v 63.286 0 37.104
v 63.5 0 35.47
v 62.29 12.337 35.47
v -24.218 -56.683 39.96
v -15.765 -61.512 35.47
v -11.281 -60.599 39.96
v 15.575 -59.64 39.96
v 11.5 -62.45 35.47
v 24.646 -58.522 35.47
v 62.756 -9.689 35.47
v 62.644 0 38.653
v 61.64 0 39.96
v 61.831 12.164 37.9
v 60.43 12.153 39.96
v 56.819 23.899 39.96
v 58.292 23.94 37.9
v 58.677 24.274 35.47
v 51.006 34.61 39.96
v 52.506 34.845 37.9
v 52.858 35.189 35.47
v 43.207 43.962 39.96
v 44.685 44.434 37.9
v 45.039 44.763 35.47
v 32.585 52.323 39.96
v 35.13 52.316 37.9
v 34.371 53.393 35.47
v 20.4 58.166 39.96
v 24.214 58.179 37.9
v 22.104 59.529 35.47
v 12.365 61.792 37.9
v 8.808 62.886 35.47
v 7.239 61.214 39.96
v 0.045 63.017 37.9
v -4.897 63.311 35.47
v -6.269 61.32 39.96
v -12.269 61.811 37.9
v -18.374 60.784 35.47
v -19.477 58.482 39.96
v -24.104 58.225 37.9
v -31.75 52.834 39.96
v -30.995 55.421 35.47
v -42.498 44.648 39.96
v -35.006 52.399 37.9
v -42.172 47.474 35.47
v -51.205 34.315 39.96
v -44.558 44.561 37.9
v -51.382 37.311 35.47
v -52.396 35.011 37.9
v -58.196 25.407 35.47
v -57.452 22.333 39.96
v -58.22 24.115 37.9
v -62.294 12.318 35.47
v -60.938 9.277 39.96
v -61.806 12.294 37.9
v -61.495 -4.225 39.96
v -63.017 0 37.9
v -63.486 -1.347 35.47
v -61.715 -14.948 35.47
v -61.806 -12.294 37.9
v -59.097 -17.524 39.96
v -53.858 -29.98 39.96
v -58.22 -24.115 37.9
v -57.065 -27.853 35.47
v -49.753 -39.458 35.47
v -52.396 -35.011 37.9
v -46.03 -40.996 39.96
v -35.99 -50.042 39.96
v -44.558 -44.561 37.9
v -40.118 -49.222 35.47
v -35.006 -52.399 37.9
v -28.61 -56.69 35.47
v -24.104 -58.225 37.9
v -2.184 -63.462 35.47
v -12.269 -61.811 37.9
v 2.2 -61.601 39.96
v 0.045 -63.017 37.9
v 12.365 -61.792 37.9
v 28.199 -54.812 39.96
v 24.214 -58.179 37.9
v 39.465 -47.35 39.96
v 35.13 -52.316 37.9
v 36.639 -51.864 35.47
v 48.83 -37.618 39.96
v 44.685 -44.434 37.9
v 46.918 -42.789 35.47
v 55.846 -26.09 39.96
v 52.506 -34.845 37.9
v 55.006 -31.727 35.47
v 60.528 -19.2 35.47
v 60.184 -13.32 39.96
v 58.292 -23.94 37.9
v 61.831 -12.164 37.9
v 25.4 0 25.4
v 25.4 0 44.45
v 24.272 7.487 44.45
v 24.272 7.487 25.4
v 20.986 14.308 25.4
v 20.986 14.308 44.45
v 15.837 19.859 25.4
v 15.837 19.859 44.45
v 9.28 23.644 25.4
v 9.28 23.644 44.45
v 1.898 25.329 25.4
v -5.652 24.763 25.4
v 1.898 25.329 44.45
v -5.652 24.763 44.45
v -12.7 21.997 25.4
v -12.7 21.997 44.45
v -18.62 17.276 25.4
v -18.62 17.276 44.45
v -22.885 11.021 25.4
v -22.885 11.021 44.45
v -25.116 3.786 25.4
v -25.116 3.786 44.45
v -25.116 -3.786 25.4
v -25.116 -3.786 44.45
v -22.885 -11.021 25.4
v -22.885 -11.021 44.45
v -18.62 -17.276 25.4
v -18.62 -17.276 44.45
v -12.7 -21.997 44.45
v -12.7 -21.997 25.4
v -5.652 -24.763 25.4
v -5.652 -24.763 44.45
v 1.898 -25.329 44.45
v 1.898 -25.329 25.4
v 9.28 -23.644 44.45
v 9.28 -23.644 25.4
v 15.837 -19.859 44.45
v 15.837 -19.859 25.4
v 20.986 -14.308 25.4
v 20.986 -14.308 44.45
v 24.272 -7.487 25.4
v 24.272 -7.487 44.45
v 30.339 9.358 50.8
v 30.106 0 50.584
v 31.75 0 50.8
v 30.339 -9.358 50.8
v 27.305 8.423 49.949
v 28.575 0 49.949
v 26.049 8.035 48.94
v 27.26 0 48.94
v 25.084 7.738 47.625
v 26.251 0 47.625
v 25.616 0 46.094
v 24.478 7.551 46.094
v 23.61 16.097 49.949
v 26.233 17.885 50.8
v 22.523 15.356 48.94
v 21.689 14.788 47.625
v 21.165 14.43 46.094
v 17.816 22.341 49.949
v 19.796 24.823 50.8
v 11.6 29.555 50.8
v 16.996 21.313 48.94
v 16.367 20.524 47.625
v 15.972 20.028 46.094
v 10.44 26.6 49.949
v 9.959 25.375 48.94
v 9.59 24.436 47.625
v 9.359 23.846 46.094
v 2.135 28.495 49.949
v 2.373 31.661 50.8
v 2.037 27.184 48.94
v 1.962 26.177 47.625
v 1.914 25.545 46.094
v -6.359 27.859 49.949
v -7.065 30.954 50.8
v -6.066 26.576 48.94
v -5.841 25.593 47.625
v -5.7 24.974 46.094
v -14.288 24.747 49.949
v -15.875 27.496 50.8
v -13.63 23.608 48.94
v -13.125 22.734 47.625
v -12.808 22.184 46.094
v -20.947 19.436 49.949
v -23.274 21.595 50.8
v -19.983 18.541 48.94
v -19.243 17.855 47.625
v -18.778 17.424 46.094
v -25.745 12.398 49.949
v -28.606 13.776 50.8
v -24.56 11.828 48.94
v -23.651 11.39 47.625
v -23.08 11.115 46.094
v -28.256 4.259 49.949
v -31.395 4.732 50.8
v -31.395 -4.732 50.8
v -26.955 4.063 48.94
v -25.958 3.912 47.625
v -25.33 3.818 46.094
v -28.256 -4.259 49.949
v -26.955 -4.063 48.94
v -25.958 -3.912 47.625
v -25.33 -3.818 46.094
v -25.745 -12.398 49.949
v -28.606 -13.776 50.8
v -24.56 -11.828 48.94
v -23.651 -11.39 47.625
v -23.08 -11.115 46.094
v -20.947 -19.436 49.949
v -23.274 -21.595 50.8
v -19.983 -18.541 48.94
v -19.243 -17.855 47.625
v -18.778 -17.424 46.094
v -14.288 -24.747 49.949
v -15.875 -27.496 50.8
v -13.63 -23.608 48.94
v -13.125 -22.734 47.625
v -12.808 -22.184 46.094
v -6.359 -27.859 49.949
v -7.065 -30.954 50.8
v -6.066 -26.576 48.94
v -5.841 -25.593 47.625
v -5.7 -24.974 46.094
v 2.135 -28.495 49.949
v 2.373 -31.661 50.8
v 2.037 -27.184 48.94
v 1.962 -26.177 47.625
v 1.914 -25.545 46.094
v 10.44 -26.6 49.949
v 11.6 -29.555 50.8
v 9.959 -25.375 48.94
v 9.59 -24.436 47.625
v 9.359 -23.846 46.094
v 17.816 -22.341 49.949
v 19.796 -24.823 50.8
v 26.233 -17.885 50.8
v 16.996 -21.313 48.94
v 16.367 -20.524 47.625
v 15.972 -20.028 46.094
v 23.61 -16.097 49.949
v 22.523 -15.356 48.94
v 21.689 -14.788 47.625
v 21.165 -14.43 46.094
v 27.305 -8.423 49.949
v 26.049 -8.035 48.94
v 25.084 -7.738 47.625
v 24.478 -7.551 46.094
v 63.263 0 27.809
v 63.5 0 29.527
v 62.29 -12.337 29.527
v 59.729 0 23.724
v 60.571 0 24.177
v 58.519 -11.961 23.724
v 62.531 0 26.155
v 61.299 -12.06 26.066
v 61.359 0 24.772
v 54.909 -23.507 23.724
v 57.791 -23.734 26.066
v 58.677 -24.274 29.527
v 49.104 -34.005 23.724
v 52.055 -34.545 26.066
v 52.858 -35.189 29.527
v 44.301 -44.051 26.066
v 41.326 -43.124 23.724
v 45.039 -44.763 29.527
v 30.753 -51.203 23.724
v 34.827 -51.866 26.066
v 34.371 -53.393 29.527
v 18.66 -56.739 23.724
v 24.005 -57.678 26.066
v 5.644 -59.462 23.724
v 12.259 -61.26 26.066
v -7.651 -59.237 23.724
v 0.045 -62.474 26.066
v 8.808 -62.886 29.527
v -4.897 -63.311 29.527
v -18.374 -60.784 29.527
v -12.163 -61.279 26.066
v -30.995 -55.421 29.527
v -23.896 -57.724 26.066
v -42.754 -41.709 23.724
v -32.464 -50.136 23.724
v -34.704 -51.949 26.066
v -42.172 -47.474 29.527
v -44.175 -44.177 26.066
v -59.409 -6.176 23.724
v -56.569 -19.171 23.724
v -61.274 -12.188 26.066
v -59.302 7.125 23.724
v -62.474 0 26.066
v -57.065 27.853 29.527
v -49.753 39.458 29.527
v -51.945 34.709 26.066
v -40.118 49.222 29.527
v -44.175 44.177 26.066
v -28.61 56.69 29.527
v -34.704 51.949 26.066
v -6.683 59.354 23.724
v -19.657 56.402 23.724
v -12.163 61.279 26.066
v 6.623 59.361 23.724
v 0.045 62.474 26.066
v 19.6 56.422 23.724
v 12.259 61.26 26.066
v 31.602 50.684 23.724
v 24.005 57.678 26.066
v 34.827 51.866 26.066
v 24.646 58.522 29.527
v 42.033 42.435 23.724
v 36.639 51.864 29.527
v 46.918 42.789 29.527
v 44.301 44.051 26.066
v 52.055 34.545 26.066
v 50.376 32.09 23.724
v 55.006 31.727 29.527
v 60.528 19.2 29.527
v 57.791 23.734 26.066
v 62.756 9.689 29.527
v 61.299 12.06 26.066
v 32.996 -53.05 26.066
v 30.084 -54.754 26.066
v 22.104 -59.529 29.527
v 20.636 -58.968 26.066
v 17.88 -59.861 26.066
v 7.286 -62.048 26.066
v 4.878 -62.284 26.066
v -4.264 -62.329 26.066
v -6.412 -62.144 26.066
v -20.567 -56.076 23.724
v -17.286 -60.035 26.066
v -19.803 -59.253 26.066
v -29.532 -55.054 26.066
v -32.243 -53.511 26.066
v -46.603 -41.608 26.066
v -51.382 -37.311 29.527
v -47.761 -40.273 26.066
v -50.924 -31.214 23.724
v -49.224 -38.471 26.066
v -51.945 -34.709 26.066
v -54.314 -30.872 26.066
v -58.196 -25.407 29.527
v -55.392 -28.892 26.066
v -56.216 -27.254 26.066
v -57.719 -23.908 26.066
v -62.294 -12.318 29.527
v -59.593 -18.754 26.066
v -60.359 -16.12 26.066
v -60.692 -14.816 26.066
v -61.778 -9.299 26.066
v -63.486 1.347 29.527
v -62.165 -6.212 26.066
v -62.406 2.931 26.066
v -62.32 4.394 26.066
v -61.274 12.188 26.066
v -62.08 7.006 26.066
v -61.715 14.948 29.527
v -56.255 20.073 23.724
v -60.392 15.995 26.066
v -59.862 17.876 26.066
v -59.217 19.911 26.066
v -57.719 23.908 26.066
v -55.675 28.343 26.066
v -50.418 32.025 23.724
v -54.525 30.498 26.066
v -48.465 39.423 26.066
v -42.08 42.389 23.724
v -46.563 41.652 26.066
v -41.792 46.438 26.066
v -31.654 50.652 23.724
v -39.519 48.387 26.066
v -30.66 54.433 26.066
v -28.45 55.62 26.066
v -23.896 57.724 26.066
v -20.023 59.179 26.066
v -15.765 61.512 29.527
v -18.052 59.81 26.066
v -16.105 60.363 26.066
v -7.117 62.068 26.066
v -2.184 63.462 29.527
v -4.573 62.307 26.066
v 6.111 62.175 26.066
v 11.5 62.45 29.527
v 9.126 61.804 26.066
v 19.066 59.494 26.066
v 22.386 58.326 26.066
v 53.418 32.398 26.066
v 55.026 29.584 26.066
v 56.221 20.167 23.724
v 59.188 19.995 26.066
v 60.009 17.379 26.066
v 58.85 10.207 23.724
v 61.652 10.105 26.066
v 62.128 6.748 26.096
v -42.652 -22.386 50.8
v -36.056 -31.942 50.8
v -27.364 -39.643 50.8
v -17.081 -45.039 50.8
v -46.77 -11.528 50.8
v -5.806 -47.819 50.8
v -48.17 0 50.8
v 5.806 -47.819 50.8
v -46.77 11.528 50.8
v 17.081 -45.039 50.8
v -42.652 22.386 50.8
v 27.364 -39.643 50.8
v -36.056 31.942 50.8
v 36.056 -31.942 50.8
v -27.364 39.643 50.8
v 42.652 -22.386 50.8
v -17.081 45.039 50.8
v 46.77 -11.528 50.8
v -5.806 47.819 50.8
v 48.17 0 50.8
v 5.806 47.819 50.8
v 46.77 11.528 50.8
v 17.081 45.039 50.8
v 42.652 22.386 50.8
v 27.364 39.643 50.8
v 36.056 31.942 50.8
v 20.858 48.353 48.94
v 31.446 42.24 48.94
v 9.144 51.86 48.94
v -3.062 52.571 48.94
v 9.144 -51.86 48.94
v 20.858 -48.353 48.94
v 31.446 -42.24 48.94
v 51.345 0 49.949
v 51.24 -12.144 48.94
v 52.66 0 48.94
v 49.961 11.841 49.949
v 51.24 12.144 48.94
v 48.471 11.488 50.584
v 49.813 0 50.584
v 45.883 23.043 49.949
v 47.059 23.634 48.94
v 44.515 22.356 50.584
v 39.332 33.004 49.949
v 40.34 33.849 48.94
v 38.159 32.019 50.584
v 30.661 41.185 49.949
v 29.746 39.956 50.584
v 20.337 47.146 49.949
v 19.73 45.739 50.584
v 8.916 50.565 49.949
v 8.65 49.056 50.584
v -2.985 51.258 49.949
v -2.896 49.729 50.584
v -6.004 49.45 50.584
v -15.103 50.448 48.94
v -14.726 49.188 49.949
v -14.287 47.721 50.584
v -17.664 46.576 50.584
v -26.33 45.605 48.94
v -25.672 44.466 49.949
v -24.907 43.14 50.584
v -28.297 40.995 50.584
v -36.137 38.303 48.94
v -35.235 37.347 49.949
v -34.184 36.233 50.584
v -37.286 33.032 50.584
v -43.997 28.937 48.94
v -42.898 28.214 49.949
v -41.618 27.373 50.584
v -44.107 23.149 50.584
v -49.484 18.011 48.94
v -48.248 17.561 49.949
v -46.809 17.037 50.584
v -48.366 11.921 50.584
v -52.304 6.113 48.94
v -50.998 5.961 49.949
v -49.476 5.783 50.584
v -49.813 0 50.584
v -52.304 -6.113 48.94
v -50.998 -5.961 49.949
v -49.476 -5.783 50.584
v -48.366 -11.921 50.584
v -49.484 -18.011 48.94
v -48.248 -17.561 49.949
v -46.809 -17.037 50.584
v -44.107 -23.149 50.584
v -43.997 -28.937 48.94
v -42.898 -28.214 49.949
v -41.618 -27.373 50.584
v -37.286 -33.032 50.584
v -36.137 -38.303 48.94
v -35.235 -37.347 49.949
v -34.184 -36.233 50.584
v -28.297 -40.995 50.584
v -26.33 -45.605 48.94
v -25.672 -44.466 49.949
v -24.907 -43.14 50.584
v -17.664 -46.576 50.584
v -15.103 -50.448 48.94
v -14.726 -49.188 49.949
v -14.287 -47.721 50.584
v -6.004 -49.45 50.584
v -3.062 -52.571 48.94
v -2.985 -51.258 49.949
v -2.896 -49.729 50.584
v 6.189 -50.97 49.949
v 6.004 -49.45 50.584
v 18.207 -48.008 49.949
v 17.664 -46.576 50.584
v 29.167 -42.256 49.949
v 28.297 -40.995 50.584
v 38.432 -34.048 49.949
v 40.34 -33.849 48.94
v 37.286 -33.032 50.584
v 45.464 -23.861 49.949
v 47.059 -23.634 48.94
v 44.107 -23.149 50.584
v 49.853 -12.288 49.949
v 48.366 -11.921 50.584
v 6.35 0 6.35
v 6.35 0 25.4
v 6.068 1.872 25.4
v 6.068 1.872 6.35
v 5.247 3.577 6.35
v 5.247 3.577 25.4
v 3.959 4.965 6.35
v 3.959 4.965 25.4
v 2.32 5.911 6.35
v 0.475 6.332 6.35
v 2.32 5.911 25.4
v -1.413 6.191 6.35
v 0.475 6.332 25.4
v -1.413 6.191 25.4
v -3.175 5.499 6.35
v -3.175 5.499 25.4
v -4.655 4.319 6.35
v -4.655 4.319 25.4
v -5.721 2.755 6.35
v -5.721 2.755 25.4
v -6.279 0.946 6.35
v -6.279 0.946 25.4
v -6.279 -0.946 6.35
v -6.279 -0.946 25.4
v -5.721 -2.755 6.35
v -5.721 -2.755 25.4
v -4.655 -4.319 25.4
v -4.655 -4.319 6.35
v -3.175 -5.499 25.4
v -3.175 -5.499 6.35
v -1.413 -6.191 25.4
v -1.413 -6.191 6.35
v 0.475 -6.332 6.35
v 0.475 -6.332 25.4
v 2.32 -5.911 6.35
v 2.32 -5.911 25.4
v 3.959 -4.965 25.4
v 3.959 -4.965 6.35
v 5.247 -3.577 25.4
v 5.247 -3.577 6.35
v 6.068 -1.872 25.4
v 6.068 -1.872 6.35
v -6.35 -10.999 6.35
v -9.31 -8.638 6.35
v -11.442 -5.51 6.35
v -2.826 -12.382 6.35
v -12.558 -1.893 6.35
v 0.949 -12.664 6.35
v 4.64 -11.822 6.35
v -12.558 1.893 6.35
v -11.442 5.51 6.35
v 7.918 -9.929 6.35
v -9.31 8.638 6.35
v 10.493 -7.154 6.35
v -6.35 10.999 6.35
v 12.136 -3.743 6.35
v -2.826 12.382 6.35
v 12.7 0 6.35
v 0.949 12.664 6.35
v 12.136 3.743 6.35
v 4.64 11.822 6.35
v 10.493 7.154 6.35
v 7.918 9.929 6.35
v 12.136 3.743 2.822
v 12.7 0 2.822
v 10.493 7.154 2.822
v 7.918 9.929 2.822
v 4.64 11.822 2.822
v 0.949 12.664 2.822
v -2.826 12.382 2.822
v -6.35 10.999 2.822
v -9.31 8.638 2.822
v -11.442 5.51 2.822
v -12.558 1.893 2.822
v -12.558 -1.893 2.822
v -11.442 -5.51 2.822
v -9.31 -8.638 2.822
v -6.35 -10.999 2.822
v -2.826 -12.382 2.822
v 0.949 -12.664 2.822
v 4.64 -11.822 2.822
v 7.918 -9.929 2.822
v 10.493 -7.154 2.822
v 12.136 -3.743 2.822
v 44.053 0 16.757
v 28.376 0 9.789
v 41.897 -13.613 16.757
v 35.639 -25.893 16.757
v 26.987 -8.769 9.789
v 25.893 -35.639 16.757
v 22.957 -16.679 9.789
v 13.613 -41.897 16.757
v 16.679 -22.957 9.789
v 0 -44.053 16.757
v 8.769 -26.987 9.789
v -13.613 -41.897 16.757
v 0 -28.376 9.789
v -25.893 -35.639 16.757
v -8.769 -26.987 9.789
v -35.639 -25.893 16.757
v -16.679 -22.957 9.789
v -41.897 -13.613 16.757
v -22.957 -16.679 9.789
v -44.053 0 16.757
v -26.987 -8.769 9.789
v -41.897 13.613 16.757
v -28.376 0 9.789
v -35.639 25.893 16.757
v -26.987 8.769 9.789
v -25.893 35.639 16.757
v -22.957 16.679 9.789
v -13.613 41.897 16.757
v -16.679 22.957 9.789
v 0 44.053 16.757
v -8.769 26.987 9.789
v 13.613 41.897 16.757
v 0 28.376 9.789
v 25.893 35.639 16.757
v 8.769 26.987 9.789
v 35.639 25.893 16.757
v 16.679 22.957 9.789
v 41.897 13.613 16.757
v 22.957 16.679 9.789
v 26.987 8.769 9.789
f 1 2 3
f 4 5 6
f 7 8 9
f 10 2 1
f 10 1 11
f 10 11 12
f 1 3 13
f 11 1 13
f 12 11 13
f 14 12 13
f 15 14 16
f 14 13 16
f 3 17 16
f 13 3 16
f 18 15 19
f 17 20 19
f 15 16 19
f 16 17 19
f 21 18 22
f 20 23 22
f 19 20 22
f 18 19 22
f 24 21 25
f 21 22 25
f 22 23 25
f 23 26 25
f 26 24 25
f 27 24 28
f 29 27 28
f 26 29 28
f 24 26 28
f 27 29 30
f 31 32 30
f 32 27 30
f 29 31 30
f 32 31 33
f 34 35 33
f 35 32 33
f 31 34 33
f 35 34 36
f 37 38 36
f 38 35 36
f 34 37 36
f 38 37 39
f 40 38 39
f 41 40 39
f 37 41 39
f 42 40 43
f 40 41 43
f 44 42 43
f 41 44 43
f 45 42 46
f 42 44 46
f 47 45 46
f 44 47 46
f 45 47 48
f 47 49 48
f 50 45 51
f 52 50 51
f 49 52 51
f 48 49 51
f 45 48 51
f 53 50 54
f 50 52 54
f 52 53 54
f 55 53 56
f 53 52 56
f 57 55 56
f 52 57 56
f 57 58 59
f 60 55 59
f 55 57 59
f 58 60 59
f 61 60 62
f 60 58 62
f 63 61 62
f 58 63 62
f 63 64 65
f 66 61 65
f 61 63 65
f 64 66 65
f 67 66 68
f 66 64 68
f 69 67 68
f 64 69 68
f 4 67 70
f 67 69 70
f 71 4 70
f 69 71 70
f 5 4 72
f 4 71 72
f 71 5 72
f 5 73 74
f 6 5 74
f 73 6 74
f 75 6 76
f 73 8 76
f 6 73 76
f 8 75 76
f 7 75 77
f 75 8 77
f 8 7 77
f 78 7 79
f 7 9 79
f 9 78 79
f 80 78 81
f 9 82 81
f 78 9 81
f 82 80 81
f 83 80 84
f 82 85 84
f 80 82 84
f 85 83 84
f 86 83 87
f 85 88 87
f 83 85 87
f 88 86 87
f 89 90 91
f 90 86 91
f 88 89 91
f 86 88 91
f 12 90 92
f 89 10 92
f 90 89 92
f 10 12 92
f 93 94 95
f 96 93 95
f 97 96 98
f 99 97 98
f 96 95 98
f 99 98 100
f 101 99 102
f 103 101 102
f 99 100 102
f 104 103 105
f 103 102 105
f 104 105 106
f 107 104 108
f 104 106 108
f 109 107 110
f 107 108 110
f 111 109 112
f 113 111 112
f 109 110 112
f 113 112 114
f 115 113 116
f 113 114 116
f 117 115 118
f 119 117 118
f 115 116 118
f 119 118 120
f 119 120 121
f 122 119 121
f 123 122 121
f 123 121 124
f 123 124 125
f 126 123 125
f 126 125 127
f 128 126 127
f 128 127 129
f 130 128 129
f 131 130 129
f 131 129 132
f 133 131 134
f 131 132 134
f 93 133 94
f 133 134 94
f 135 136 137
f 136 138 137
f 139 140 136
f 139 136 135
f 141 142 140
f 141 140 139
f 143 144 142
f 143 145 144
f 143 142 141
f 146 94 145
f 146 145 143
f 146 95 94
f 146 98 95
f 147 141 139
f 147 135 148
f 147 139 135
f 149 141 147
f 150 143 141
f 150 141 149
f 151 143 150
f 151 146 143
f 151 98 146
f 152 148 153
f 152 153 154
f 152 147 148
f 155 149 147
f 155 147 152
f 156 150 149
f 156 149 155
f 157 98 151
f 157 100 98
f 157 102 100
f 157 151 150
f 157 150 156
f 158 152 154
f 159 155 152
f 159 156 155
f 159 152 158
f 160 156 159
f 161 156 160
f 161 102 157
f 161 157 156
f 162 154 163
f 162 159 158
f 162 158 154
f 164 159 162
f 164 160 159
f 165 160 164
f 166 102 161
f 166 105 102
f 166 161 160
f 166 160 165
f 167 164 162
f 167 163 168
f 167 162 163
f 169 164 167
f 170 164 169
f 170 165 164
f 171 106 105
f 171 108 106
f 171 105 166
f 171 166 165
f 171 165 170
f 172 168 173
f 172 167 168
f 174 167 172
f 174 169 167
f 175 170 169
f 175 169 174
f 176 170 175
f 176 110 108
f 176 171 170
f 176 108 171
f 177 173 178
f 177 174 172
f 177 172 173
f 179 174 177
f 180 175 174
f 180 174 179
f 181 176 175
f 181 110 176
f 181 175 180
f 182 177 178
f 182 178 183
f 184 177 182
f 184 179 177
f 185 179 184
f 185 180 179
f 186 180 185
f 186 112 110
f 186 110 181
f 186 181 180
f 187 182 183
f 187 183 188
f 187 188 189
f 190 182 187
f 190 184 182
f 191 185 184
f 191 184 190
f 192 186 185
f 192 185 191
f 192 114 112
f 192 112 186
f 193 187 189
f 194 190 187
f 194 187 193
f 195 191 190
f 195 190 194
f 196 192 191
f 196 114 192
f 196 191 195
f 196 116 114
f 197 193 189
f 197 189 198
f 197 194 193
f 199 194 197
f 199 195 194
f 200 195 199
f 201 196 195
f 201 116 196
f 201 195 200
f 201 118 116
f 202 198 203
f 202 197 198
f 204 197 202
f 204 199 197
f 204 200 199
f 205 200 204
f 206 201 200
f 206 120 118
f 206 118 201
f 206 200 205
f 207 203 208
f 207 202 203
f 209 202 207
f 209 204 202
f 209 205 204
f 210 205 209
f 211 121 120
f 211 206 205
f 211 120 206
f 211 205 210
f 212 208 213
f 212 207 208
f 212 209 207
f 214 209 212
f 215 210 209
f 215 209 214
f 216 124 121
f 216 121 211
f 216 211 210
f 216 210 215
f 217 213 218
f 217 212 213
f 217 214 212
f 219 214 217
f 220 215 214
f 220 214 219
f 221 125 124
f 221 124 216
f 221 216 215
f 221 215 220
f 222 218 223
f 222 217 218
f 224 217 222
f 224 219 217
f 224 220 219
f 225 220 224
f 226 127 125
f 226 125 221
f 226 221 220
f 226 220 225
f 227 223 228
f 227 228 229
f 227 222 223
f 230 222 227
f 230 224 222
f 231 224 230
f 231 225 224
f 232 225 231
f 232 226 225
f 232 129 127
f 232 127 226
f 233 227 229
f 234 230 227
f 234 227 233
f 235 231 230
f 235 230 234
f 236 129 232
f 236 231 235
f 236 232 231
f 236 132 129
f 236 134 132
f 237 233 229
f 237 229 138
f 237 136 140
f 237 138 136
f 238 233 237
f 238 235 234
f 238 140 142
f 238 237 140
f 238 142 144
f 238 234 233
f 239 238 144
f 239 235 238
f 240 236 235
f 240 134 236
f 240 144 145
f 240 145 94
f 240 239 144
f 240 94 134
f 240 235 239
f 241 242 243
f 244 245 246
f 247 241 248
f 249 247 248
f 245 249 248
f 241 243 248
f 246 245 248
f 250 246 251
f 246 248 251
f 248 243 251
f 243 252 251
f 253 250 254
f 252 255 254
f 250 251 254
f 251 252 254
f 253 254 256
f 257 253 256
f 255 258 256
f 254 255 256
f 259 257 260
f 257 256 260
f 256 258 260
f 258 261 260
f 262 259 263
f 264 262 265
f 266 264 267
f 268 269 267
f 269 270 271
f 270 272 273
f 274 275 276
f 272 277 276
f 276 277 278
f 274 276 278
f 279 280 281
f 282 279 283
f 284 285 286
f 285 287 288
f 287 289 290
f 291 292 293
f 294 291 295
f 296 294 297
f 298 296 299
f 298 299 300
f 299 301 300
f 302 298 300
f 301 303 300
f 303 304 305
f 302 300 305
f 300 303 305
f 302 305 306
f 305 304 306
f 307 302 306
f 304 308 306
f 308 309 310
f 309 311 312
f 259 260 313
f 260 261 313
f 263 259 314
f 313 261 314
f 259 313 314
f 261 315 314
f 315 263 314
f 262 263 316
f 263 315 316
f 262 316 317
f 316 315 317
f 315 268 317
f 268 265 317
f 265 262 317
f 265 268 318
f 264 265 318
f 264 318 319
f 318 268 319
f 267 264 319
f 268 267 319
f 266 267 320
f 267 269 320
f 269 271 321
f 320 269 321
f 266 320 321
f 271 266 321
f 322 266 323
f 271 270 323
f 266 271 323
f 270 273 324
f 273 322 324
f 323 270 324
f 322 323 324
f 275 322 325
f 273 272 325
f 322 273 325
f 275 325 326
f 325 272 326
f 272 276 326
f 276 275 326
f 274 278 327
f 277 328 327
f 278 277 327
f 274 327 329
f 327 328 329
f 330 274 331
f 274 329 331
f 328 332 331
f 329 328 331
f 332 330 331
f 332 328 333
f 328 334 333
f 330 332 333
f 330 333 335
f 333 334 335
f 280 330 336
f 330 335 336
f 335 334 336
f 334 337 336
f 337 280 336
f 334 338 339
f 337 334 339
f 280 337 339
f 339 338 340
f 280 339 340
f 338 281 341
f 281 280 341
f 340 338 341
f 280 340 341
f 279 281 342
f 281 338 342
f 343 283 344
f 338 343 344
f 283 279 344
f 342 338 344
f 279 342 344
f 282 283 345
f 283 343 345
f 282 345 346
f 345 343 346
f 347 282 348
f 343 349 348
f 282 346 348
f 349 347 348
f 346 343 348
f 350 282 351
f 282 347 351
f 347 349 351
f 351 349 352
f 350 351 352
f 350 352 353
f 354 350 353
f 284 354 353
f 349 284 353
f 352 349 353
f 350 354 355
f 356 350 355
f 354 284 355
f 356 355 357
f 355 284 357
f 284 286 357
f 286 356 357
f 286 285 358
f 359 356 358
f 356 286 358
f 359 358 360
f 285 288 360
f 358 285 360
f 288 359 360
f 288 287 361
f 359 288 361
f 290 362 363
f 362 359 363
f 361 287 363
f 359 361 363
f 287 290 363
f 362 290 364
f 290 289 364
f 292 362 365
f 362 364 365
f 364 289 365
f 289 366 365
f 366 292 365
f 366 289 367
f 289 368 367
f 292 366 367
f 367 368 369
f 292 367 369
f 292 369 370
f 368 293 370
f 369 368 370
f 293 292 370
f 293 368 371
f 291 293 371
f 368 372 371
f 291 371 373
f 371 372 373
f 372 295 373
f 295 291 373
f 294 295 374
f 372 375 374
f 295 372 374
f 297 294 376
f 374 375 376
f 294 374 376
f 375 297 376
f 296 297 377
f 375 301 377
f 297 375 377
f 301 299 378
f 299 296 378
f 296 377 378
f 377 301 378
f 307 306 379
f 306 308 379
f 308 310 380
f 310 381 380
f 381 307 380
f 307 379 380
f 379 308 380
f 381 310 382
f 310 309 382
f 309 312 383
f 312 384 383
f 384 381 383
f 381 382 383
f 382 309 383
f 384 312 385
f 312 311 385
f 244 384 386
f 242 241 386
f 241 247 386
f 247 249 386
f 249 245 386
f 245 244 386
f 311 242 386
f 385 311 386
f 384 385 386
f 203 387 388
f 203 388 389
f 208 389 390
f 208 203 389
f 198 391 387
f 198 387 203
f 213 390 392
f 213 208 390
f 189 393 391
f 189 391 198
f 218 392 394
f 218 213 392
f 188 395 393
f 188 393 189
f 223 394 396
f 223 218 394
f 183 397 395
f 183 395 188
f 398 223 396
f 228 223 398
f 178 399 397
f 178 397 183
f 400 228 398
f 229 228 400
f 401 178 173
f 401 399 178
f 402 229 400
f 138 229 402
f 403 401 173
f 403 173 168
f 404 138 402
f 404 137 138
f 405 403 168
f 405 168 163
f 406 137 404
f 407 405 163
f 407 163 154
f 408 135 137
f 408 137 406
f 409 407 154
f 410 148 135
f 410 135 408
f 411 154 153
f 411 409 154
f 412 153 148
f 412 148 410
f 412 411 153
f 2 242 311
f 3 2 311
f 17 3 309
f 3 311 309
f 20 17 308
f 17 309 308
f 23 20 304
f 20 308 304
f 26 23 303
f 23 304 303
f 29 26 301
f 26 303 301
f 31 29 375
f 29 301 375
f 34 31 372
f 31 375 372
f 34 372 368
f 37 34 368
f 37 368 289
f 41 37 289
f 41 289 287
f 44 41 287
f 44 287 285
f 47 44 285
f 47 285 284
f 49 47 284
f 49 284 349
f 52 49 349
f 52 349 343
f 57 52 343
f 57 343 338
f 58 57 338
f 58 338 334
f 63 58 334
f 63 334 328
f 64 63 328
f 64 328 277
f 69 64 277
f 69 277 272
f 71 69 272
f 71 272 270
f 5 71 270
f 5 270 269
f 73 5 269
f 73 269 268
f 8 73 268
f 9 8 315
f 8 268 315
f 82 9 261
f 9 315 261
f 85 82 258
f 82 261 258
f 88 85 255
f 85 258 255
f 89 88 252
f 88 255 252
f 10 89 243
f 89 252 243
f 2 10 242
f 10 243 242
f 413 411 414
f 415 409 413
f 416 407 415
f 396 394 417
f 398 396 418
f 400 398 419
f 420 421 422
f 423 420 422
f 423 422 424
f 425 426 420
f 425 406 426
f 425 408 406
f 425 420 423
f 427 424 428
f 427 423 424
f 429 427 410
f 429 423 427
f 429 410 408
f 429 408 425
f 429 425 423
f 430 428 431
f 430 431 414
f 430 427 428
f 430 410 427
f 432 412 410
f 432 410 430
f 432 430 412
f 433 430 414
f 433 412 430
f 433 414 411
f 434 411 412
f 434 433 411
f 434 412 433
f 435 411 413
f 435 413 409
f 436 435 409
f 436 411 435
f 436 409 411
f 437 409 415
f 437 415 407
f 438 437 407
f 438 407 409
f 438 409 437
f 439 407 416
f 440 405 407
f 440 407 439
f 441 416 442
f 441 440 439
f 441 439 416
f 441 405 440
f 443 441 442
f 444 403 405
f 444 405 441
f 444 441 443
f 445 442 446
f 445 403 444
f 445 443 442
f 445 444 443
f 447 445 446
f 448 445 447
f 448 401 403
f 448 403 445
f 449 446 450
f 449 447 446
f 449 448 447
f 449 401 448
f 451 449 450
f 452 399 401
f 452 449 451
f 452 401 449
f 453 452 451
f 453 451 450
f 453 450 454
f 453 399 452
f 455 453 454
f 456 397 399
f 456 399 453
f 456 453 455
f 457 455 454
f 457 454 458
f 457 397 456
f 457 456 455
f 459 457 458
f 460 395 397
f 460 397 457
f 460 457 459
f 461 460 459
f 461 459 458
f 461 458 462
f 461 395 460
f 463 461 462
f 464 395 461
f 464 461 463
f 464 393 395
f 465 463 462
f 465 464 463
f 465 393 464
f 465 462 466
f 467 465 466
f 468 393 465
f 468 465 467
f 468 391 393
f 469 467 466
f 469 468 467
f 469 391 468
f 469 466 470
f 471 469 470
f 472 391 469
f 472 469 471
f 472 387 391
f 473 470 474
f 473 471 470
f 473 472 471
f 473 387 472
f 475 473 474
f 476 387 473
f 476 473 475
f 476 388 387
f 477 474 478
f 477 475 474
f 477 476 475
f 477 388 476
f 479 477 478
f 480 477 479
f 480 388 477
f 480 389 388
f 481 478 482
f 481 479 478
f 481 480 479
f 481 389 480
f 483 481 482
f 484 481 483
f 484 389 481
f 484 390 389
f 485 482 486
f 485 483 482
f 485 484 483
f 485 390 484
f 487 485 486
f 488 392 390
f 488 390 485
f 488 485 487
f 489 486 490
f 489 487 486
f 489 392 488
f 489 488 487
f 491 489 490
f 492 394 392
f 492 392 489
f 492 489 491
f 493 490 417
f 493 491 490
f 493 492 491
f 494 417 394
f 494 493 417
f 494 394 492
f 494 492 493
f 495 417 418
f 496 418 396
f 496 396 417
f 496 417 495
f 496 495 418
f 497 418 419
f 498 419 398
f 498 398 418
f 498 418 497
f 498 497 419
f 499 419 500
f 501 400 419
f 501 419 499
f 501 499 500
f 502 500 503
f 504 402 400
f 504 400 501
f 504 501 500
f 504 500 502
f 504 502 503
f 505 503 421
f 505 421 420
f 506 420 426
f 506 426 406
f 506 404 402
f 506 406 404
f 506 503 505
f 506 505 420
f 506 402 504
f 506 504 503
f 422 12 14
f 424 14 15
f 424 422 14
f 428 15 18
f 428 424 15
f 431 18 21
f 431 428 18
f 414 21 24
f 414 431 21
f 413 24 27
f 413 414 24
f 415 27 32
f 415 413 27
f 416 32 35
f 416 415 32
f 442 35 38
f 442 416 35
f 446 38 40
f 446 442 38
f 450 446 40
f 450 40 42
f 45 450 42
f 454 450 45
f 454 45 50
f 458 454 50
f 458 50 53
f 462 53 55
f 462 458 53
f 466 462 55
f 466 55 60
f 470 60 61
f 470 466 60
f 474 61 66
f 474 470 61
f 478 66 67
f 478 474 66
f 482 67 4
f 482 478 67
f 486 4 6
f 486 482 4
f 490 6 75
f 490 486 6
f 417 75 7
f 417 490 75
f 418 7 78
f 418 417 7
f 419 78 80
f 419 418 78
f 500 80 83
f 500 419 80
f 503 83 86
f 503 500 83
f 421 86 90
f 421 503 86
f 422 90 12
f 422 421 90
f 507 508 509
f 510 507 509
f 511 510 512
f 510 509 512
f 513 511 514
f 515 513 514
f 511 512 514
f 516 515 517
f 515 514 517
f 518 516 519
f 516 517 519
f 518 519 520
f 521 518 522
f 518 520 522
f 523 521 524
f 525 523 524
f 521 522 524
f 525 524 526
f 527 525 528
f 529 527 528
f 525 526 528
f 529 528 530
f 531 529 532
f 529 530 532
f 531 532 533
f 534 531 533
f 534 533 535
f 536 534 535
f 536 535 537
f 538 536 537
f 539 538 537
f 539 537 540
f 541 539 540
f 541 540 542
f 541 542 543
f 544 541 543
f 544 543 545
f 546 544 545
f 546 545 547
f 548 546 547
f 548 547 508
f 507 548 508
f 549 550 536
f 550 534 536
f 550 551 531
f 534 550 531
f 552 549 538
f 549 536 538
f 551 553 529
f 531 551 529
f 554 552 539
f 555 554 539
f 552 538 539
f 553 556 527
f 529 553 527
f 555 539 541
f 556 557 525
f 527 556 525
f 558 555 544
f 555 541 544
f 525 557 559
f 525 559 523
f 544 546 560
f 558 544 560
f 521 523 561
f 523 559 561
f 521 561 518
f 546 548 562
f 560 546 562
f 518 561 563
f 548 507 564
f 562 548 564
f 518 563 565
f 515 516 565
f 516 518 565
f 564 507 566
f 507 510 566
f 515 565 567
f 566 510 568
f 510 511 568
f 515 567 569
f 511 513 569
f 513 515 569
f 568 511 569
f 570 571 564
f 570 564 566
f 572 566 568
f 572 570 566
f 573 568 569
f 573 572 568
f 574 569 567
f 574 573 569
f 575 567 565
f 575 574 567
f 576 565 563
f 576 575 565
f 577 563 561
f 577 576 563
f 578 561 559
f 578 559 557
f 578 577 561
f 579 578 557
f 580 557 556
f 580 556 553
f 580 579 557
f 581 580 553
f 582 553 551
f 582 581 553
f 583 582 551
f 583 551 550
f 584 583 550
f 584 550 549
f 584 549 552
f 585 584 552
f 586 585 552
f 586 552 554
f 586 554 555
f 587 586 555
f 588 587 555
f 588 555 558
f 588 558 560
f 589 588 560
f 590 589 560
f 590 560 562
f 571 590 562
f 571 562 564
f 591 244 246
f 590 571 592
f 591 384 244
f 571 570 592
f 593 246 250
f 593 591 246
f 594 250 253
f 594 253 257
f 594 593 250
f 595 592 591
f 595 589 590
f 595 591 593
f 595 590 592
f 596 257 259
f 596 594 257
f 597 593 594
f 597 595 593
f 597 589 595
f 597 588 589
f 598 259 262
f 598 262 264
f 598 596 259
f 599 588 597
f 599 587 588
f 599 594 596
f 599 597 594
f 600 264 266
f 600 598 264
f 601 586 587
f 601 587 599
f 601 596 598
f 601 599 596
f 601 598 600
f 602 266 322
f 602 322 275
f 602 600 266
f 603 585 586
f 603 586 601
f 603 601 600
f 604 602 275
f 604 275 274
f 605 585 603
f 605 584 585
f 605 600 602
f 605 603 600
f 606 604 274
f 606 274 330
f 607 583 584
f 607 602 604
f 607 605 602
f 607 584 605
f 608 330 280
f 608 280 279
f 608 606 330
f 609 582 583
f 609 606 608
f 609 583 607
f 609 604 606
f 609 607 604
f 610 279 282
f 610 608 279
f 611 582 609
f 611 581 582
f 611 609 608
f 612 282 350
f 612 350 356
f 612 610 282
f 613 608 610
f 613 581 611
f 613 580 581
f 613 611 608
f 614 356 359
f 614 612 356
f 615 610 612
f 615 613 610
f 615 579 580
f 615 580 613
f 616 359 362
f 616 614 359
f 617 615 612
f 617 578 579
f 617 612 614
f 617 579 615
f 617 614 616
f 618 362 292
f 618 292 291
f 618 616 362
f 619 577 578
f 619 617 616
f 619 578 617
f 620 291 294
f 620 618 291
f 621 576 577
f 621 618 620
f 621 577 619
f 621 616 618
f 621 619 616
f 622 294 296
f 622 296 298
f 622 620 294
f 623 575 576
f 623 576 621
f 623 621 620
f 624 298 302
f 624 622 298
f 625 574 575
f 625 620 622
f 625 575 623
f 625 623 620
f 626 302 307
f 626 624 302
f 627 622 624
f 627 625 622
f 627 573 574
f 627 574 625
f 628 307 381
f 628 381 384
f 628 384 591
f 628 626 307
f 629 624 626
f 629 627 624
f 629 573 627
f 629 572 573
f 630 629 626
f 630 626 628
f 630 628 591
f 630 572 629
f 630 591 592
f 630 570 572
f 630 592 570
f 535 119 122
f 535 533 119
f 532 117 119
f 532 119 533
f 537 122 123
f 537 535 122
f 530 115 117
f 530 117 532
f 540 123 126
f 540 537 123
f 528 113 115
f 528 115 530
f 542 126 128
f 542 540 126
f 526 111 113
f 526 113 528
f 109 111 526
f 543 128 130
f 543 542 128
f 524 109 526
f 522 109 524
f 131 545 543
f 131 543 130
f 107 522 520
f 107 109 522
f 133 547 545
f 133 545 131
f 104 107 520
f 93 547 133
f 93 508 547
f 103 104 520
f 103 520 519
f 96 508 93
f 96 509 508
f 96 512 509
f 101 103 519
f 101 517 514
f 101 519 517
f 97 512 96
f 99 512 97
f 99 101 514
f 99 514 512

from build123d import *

# Parameters (mm, degrees)
SKETCH1_R           = 63.5
BOSS_EXTRUDE1_DEPTH = 50.8
SKETCH2_R           = 25.4
CUT_EXTRUDE2_DEPTH  = 25.4
SKETCH3_R           = 6.35
CUT_EXTRUDE3_DEPTH  = 94.3255592
SKETCH6_R           = 12.7
CUT_EXTRUDE4_DEPTH  = 6.35
CHAMFER1_SIZE       = 12.7
FILLET1_R           = 6.35


with BuildPart() as part:
    # Sketch1 → Boss-Extrude1 (new body)
    with BuildSketch(Plane.XY):
        Circle(SKETCH1_R)
    extrude(amount=BOSS_EXTRUDE1_DEPTH)

    # Sketch2 → Cut-Extrude2 (cut)
    with BuildSketch(Plane.XY.offset(50.8)):
        Circle(SKETCH2_R)
    extrude(amount=-CUT_EXTRUDE2_DEPTH, mode=Mode.SUBTRACT)

    # Sketch3 → Cut-Extrude3 (cut, through all)
    with BuildSketch(Plane.XY.offset(25.4)):
        Circle(SKETCH3_R)
    extrude(amount=-CUT_EXTRUDE3_DEPTH, mode=Mode.SUBTRACT)

    # Sketch4 → Cut-Revolve1 (revolve, cut)
    with BuildSketch(Plane(origin=(0, 0, 0), x_dir=(0, 0, -1), z_dir=(1, 0, 0)), mode=Mode.PRIVATE) as cut_revolve1_sk:
        Polygon((0, 63.5), (-25.4, 63.5), (0, 6.35), align=None)
    revolve(cut_revolve1_sk.sketch.rotate(Axis((0, 0, 0), (0, 0, -1)), 90), axis=Axis((0, 0, 0), (0, 0, -1)), mode=Mode.SUBTRACT)

    # Sketch6 → Cut-Extrude4 (cut)
    with BuildSketch(Plane.XY):
        Circle(SKETCH6_R)
    extrude(amount=CUT_EXTRUDE4_DEPTH, mode=Mode.SUBTRACT)

    # Chamfer1
    chamfer1_edges = [part.edges().sort_by_distance(p)[0] for p in [
        (-63.5, 0, 50.8),
    ]]
    chamfer(chamfer1_edges, length=CHAMFER1_SIZE)

    # Fillet1
    fillet1_edges = [part.edges().sort_by_distance(p)[0] for p in [
        (-63.5, 0, 25.4),
        (-50.8, 0, 50.8),
        (-63.5, 0, 38.1),
        (-25.4, 0, 50.8),
    ]]
    fillet(fillet1_edges, radius=FILLET1_R)


solid = part.part
